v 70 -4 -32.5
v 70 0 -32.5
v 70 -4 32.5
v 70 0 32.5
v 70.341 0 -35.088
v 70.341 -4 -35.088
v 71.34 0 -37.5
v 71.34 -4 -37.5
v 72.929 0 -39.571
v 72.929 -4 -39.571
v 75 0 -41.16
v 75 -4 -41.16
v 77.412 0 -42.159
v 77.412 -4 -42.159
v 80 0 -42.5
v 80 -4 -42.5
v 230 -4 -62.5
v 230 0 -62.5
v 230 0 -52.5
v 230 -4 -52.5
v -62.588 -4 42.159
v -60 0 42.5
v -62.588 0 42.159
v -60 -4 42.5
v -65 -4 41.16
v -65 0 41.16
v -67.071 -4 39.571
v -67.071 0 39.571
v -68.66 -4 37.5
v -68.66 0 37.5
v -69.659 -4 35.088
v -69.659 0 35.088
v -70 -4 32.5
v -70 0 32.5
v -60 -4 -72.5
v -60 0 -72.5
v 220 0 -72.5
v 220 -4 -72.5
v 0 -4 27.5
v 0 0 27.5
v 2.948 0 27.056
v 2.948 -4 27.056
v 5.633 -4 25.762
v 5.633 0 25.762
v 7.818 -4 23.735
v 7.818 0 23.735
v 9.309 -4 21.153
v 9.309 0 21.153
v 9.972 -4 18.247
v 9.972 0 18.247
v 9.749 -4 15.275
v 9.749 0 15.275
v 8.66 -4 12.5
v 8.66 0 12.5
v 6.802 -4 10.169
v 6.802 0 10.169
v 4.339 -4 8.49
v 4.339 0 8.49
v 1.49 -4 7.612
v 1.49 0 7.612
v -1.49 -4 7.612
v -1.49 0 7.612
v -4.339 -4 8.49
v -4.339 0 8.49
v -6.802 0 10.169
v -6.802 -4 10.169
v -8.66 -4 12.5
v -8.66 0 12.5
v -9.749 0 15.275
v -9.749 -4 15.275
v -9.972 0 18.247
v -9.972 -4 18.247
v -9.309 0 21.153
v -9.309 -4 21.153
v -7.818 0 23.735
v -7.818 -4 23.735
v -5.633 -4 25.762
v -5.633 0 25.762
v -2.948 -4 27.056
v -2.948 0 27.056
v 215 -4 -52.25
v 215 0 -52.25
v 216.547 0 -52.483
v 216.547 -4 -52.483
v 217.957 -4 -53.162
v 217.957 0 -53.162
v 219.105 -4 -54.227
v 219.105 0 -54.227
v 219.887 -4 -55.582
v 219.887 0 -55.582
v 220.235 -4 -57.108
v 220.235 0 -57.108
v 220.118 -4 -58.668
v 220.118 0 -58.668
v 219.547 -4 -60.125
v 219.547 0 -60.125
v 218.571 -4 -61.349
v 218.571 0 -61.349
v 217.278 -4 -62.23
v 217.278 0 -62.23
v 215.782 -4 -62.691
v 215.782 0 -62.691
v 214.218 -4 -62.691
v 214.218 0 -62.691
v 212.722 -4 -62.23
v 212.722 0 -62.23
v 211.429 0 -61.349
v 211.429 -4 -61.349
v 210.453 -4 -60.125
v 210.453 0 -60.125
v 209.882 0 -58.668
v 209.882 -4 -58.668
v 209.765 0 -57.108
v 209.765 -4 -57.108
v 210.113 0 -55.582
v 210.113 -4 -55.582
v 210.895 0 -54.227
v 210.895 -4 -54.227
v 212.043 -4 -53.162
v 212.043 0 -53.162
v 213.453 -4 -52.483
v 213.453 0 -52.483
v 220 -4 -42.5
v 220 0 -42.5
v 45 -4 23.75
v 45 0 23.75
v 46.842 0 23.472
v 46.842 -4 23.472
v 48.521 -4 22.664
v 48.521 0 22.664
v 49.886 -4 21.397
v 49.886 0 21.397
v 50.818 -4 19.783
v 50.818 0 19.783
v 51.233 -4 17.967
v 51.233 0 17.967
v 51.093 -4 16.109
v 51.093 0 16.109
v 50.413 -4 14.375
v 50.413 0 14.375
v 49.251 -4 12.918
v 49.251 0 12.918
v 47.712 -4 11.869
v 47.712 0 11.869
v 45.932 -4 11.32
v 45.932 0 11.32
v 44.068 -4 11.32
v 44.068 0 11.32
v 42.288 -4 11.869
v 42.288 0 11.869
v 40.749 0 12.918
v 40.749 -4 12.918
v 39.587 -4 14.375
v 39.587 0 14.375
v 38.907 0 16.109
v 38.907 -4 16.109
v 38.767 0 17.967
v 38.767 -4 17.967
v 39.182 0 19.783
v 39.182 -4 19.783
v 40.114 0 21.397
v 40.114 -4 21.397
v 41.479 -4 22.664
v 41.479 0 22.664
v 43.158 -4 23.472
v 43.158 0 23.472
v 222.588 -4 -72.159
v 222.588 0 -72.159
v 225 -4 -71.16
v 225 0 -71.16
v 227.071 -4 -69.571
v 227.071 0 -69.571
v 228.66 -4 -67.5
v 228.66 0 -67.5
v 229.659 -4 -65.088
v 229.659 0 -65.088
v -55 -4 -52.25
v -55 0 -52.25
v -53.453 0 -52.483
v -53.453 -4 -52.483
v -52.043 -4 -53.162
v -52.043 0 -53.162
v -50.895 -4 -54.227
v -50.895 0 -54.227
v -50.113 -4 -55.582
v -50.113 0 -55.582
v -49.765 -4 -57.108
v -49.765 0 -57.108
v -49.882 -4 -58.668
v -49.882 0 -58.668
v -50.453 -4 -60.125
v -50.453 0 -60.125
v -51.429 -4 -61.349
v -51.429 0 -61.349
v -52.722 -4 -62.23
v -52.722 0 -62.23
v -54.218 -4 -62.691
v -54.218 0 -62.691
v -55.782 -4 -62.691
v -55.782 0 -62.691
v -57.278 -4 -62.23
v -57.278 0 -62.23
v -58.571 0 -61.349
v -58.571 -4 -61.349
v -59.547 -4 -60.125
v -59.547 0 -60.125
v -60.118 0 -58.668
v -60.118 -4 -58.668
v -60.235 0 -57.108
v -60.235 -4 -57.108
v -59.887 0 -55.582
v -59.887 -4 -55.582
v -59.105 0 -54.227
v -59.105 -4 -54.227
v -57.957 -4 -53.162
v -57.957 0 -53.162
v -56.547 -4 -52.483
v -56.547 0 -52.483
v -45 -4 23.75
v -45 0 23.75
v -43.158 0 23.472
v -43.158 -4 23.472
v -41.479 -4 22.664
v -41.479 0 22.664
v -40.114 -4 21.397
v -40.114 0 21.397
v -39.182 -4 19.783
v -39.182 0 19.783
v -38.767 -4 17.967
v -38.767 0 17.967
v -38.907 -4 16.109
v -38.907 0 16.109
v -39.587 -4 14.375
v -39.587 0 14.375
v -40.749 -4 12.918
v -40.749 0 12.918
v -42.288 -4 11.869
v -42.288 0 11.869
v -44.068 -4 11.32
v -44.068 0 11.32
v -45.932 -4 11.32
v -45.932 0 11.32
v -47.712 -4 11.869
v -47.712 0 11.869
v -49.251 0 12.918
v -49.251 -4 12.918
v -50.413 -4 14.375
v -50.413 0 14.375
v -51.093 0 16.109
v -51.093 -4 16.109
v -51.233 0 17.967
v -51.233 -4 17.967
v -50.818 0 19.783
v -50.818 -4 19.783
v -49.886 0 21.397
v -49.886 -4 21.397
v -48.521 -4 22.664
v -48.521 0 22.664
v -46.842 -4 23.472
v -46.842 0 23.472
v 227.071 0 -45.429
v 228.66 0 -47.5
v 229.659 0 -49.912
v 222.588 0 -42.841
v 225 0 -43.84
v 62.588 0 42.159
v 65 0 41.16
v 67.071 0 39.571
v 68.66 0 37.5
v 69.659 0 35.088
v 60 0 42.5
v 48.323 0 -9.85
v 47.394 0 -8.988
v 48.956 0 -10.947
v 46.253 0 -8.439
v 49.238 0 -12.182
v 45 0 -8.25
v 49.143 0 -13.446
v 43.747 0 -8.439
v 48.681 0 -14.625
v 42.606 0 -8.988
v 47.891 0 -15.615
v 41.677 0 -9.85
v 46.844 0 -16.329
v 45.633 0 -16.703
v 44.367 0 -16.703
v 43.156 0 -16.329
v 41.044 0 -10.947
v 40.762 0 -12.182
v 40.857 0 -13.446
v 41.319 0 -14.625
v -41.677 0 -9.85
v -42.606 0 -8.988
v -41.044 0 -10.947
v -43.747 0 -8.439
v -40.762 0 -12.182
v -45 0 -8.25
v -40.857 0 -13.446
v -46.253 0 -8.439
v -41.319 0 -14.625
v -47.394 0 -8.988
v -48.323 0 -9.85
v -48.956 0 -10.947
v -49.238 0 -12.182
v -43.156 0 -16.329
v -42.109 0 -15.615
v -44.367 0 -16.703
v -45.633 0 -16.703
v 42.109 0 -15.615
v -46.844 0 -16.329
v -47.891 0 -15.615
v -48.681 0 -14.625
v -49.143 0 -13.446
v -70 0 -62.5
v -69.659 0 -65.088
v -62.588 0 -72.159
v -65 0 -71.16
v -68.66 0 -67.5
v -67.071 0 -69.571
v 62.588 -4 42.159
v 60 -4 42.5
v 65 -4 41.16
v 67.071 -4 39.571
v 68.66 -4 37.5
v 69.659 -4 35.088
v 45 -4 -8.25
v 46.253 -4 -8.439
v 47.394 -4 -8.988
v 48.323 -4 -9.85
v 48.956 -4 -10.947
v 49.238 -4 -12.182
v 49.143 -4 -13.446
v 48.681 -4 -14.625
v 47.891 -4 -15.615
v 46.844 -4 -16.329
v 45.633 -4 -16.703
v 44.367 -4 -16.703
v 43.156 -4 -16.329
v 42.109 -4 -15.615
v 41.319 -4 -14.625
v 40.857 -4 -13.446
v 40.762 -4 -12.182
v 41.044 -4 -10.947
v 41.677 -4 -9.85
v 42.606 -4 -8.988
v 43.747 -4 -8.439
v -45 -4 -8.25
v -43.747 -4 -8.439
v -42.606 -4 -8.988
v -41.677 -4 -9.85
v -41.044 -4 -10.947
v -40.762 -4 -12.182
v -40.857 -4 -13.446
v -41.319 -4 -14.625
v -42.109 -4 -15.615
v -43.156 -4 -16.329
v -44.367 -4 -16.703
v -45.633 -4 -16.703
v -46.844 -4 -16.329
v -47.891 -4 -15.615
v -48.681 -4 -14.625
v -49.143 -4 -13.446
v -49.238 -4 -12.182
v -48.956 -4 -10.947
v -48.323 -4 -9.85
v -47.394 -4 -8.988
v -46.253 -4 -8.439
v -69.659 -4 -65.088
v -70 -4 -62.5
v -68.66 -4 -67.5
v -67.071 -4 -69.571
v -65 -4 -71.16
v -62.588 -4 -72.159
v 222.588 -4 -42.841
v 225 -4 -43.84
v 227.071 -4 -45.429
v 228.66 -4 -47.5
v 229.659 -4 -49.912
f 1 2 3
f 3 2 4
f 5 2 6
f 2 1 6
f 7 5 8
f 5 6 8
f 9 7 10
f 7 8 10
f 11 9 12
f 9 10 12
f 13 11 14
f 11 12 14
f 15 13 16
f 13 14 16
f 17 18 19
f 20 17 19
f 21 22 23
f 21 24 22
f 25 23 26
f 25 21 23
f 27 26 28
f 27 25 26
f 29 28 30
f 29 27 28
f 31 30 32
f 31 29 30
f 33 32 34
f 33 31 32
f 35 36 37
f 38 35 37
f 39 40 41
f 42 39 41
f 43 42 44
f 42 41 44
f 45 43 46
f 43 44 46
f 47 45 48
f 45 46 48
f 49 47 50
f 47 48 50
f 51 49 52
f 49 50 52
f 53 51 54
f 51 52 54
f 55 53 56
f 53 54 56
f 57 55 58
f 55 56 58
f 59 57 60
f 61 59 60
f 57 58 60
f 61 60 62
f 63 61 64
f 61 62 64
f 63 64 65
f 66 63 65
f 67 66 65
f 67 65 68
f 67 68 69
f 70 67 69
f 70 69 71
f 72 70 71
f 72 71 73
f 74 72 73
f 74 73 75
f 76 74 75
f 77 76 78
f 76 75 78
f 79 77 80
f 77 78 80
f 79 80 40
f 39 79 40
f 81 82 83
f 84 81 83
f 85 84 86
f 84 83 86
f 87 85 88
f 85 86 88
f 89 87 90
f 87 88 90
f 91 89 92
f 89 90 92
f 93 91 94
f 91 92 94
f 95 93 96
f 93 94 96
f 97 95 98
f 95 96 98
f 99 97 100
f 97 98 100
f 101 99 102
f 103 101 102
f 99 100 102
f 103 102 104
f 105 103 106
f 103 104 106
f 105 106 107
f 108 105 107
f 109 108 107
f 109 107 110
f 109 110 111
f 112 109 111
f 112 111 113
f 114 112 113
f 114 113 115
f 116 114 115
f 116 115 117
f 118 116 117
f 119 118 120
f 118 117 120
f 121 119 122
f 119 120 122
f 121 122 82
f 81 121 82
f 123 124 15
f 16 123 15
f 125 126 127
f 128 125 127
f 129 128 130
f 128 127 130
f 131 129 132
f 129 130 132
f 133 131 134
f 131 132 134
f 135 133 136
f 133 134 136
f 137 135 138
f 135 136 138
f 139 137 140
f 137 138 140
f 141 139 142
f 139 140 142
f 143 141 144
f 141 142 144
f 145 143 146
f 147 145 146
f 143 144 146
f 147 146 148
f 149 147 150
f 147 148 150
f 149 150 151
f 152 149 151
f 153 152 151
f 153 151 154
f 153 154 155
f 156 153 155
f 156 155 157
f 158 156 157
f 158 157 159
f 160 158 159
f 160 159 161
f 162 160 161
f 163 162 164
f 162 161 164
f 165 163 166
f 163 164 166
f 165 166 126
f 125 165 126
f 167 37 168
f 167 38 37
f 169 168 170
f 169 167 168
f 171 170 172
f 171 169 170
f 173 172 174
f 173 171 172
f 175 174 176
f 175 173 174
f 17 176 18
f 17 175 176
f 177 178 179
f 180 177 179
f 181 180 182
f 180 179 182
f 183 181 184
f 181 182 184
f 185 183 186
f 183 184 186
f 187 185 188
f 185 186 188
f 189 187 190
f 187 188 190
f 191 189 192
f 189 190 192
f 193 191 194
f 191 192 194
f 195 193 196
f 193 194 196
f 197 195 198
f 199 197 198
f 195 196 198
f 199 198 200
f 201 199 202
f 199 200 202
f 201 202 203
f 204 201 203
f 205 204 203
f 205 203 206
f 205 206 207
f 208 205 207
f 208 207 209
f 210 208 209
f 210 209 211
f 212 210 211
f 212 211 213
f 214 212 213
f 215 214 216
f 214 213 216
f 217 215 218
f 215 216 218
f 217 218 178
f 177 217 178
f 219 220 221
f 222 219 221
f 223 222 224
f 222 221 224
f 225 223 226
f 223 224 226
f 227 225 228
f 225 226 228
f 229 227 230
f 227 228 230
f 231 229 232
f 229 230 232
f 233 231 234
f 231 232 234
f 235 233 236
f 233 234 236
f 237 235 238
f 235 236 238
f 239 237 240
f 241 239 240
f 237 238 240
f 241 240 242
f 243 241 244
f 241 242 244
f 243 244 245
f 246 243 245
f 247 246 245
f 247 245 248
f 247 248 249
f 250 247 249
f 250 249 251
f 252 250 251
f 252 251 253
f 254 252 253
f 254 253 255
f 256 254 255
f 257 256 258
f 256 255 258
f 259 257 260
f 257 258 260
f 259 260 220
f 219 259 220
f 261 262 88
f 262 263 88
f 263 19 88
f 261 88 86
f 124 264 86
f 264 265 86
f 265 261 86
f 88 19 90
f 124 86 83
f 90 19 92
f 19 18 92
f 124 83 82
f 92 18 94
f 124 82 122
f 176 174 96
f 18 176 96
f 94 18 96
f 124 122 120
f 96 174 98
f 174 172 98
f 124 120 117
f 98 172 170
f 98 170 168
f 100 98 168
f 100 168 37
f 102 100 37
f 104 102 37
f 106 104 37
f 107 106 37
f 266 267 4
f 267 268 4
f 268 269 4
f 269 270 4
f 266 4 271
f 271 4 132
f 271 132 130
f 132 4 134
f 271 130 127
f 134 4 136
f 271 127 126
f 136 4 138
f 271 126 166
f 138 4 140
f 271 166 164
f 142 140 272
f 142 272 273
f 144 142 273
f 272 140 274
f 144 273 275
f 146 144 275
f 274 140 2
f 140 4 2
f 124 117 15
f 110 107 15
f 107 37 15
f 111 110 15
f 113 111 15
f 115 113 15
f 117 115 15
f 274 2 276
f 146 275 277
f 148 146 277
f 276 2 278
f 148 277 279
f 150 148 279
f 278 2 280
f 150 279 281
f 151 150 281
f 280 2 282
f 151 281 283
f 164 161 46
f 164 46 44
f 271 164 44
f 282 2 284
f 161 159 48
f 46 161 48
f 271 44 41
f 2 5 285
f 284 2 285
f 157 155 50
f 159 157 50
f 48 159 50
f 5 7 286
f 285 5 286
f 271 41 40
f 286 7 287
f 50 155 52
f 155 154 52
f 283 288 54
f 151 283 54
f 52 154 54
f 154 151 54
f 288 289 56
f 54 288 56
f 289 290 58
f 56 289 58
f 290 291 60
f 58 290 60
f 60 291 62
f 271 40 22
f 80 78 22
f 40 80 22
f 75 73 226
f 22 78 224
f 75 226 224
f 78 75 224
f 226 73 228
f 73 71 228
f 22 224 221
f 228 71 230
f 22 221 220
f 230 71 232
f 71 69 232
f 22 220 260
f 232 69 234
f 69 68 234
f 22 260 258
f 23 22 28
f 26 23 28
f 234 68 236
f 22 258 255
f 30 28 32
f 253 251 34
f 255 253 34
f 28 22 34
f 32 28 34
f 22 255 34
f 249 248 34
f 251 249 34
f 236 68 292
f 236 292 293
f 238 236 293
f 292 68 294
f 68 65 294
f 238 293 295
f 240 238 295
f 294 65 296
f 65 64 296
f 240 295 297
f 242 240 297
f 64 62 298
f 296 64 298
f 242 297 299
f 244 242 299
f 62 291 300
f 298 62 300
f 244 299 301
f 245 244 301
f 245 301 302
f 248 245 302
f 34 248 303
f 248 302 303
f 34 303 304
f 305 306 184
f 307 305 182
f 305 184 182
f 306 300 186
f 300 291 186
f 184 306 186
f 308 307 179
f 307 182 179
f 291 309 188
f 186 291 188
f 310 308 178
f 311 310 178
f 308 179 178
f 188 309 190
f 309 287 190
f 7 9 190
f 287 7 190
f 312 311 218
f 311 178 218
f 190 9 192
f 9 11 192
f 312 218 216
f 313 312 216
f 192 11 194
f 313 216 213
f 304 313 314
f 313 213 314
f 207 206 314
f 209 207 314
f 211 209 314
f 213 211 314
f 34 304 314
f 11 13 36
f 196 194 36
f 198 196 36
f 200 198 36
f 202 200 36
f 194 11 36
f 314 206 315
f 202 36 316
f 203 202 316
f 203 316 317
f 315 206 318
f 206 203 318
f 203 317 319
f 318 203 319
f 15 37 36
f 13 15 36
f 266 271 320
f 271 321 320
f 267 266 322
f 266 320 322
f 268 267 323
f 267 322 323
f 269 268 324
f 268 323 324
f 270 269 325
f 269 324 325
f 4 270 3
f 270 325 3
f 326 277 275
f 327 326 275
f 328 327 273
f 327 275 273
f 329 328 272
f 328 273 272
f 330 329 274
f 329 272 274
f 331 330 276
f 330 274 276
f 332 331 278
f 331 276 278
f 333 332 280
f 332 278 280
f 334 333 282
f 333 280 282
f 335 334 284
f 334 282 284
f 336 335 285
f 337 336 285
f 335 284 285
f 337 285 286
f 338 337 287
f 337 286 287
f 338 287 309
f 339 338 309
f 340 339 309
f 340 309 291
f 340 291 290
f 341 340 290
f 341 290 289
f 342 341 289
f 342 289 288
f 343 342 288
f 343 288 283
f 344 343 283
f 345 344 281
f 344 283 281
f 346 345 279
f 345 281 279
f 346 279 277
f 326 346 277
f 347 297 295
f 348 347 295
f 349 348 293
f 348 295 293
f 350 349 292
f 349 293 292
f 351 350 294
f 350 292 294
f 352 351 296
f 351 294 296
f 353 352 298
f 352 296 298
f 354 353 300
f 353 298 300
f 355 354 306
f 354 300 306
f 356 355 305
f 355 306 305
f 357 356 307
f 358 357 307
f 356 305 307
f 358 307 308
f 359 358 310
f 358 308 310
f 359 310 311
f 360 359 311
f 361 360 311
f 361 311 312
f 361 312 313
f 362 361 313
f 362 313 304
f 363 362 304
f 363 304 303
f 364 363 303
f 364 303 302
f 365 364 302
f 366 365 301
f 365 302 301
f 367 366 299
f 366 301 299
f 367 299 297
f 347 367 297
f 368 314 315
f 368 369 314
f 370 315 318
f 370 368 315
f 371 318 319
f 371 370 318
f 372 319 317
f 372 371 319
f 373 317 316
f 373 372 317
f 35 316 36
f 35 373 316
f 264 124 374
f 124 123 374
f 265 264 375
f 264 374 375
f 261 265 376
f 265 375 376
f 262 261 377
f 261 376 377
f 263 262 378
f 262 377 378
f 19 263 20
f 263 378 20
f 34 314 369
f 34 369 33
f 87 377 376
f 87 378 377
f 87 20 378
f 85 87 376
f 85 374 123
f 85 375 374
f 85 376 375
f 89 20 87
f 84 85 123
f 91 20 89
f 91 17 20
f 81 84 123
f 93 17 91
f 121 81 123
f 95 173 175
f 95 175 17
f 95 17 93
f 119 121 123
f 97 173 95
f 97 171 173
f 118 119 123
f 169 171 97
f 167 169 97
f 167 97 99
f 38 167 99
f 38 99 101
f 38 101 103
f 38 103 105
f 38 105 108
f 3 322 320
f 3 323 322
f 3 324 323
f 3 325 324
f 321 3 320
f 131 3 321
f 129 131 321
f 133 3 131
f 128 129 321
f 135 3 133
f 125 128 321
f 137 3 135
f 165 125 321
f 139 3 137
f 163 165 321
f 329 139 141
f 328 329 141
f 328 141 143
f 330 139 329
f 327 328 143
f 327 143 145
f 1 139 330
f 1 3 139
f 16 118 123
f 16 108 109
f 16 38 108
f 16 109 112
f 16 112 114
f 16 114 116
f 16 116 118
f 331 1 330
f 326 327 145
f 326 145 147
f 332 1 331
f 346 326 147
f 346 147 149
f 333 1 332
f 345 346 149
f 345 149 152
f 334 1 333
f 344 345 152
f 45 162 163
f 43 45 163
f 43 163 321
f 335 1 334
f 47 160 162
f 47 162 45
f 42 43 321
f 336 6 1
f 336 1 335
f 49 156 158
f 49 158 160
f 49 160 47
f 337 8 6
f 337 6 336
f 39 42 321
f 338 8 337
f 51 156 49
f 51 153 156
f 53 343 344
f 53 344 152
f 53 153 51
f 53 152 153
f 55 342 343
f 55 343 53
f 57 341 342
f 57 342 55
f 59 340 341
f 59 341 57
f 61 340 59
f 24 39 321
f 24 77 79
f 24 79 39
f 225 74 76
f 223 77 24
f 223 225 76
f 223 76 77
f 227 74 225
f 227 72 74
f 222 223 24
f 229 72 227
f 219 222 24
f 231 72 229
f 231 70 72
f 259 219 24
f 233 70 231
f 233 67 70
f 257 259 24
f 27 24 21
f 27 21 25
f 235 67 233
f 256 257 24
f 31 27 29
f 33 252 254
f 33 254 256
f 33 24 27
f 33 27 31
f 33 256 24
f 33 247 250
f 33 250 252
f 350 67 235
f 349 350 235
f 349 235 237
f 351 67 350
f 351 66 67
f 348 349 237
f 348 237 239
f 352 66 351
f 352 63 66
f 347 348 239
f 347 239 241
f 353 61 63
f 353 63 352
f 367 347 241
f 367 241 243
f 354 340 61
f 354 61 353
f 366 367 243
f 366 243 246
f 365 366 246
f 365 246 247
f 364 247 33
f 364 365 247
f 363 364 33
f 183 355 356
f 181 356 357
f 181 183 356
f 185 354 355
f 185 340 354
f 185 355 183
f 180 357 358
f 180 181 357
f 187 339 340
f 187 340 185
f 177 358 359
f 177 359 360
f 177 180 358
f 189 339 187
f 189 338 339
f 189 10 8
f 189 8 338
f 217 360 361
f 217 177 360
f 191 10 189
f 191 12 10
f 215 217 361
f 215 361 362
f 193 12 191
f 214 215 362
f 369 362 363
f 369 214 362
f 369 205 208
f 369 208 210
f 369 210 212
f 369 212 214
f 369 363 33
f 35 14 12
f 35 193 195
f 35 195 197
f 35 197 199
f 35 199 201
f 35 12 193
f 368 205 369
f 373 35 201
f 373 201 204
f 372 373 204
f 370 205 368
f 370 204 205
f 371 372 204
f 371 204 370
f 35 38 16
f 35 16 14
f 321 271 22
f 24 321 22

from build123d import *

# Parameters (mm, degrees)
SKETCH1_R          = 5.25
SKETCH1_R_2        = 10
SKETCH1_R_3        = 6.25
SKETCH1_R_4        = 4.25
BASE_FLANGE1_DEPTH = 4
FILLET1_R          = 10


# Sheet-metal steps are written as plain solids
with BuildPart() as part:
    # Sketch1 → Base-Flange1 (new body)
    with BuildSketch(Plane(origin=(0, 0, 0), x_dir=(1, 0, 0), z_dir=(0, 1, 0))):
        Polygon((70, -42.5), (-70, -42.5), (-70, 42.5), (-70, 72.5), (230, 72.5), (230, 42.5), (70, 42.5), align=None)
        with Locations(Location((-55, 57.5, 0), (0, 0, 270))):
            Circle(SKETCH1_R, mode=Mode.SUBTRACT)
        with Locations(Location((215, 57.5, 0), (0, 0, 270))):
            Circle(SKETCH1_R, mode=Mode.SUBTRACT)
        with Locations(Location((0, -17.5, 0), (0, 0, 270))):
            Circle(SKETCH1_R_2, mode=Mode.SUBTRACT)
        with Locations(Location((-45, -17.5, 0), (0, 0, 270))):
            Circle(SKETCH1_R_3, mode=Mode.SUBTRACT)
        with Locations(Location((45, -17.5, 0), (0, 0, 270))):
            Circle(SKETCH1_R_3, mode=Mode.SUBTRACT)
        with Locations(Location((-45, 12.5, 0), (0, 0, 270))):
            Circle(SKETCH1_R_4, mode=Mode.SUBTRACT)
        with Locations(Location((45, 12.5, 0), (0, 0, 270))):
            Circle(SKETCH1_R_4, mode=Mode.SUBTRACT)
    extrude(amount=-BASE_FLANGE1_DEPTH)

    # Fillet1
    fillet1_edges = [part.edges().sort_by_distance(p)[0] for p in [
        (-70, -2, -72.5),
        (230, -2, -72.5),
        (230, -2, -42.5),
        (70, -2, -42.5),
        (70, -2, 42.5),
        (-70, -2, 42.5),
    ]]
    fillet(fillet1_edges, radius=FILLET1_R)


solid = part.part
